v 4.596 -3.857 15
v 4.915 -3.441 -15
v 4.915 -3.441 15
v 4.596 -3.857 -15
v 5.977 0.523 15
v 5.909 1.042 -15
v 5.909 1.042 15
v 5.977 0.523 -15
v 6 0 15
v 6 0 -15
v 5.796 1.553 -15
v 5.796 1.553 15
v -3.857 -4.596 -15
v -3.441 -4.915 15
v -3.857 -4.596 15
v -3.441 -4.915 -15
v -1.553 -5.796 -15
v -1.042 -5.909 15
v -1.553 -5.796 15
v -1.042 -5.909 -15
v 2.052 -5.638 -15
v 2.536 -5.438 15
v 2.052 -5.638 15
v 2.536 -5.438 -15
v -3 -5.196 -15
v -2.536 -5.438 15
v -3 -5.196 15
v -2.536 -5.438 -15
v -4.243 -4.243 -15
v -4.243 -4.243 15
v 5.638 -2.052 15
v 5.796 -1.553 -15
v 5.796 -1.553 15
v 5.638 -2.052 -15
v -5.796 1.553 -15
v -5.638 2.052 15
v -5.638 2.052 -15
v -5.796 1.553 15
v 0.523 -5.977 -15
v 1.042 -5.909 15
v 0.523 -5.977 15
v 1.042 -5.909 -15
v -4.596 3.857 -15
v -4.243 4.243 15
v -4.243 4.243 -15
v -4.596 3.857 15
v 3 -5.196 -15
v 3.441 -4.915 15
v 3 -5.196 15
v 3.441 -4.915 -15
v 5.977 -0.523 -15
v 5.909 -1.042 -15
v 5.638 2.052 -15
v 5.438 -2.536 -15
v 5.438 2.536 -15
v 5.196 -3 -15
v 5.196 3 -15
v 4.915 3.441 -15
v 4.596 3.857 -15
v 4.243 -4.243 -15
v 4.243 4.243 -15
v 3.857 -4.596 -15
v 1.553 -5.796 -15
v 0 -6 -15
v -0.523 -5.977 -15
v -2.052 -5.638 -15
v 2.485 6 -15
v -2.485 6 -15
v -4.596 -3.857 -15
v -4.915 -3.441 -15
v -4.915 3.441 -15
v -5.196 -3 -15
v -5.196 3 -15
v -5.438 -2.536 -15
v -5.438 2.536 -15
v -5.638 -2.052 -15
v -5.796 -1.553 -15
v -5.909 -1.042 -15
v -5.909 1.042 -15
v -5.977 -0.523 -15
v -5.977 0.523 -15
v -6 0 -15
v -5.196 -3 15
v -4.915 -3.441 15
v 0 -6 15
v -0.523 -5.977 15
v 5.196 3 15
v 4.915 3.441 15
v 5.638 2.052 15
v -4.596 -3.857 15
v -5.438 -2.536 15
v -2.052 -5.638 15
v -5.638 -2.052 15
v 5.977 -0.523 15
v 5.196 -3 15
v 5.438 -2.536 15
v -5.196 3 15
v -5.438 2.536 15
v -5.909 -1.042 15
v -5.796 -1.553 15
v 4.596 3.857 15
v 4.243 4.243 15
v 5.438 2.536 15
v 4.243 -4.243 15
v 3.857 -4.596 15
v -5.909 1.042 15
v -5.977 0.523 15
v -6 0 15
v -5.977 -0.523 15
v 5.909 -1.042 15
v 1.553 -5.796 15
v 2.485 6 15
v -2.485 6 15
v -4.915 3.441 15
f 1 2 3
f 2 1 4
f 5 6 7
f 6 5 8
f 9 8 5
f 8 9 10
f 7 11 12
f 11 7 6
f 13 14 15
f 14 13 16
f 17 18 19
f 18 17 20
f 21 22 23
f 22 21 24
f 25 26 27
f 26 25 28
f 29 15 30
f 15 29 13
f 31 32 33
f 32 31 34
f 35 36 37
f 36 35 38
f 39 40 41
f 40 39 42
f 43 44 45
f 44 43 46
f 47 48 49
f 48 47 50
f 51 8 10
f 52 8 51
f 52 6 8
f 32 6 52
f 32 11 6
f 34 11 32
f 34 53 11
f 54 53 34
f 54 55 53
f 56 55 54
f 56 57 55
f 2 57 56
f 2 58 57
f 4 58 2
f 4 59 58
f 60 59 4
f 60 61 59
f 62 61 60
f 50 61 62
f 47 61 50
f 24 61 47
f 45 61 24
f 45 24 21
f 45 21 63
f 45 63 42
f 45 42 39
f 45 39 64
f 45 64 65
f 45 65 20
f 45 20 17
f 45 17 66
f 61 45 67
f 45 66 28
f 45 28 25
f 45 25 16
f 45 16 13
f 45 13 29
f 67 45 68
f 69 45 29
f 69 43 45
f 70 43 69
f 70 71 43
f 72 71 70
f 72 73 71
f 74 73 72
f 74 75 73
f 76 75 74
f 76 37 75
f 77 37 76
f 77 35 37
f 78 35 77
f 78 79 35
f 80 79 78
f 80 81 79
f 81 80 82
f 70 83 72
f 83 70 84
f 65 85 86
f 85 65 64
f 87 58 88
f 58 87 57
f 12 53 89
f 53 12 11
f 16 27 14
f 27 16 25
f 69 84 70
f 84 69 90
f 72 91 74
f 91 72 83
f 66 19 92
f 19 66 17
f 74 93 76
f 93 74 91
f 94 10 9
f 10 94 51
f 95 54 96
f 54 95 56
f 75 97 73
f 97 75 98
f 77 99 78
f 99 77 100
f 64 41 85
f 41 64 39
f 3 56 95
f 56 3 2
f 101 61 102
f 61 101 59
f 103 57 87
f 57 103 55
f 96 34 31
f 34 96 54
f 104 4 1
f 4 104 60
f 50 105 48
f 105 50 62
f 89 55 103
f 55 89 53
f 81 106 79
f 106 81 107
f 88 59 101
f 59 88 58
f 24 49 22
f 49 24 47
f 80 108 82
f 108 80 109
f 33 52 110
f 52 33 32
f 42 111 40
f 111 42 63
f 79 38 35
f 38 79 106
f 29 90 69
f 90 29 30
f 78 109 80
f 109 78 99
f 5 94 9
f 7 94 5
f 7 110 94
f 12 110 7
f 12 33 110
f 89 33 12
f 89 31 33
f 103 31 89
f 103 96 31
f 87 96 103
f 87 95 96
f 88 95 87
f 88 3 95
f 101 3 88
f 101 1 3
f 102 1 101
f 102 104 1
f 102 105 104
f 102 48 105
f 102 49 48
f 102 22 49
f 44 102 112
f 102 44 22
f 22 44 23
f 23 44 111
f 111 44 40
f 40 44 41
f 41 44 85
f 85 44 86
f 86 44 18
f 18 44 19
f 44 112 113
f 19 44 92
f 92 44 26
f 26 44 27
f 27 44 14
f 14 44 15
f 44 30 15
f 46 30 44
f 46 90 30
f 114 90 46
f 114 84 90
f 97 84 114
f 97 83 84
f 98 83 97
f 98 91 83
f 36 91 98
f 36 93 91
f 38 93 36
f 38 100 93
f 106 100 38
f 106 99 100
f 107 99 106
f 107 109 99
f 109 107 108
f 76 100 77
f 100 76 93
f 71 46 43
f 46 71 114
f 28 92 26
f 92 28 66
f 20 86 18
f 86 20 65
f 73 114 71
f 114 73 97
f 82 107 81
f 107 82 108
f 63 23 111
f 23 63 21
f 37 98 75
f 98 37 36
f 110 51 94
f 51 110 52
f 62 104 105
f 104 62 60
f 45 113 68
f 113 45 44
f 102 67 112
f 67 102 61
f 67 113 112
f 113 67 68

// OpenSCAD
// Nathanael Lane
// 2015.1.22

module vertical_hole(r = 1, d = 0, center = false, h = 1, point = false){
	
	_r = (d == 0) ? r : d / 2;
	
	difference(){

		union(){
			//hole
			cylinder(r = _r, h = h, center = center);
			//teardrop
			translate([0, sqrt(2) * _r / 2, center ? 0 : h / 2]){

				rotate([0, 0, 45]){

					cube([_r, _r, h], center = true);
				}
			}
		}
		if(!point){
	
			translate([0, _r * 2, center ? 0 : h/2]){
	
				cube([2 * _r, 2 * _r, h + 2], center = true);
			}
		}
	}
}

$fa = 5;
$fs = 0.05;
vertical_hole(center = true, h = 30, d = 12);
